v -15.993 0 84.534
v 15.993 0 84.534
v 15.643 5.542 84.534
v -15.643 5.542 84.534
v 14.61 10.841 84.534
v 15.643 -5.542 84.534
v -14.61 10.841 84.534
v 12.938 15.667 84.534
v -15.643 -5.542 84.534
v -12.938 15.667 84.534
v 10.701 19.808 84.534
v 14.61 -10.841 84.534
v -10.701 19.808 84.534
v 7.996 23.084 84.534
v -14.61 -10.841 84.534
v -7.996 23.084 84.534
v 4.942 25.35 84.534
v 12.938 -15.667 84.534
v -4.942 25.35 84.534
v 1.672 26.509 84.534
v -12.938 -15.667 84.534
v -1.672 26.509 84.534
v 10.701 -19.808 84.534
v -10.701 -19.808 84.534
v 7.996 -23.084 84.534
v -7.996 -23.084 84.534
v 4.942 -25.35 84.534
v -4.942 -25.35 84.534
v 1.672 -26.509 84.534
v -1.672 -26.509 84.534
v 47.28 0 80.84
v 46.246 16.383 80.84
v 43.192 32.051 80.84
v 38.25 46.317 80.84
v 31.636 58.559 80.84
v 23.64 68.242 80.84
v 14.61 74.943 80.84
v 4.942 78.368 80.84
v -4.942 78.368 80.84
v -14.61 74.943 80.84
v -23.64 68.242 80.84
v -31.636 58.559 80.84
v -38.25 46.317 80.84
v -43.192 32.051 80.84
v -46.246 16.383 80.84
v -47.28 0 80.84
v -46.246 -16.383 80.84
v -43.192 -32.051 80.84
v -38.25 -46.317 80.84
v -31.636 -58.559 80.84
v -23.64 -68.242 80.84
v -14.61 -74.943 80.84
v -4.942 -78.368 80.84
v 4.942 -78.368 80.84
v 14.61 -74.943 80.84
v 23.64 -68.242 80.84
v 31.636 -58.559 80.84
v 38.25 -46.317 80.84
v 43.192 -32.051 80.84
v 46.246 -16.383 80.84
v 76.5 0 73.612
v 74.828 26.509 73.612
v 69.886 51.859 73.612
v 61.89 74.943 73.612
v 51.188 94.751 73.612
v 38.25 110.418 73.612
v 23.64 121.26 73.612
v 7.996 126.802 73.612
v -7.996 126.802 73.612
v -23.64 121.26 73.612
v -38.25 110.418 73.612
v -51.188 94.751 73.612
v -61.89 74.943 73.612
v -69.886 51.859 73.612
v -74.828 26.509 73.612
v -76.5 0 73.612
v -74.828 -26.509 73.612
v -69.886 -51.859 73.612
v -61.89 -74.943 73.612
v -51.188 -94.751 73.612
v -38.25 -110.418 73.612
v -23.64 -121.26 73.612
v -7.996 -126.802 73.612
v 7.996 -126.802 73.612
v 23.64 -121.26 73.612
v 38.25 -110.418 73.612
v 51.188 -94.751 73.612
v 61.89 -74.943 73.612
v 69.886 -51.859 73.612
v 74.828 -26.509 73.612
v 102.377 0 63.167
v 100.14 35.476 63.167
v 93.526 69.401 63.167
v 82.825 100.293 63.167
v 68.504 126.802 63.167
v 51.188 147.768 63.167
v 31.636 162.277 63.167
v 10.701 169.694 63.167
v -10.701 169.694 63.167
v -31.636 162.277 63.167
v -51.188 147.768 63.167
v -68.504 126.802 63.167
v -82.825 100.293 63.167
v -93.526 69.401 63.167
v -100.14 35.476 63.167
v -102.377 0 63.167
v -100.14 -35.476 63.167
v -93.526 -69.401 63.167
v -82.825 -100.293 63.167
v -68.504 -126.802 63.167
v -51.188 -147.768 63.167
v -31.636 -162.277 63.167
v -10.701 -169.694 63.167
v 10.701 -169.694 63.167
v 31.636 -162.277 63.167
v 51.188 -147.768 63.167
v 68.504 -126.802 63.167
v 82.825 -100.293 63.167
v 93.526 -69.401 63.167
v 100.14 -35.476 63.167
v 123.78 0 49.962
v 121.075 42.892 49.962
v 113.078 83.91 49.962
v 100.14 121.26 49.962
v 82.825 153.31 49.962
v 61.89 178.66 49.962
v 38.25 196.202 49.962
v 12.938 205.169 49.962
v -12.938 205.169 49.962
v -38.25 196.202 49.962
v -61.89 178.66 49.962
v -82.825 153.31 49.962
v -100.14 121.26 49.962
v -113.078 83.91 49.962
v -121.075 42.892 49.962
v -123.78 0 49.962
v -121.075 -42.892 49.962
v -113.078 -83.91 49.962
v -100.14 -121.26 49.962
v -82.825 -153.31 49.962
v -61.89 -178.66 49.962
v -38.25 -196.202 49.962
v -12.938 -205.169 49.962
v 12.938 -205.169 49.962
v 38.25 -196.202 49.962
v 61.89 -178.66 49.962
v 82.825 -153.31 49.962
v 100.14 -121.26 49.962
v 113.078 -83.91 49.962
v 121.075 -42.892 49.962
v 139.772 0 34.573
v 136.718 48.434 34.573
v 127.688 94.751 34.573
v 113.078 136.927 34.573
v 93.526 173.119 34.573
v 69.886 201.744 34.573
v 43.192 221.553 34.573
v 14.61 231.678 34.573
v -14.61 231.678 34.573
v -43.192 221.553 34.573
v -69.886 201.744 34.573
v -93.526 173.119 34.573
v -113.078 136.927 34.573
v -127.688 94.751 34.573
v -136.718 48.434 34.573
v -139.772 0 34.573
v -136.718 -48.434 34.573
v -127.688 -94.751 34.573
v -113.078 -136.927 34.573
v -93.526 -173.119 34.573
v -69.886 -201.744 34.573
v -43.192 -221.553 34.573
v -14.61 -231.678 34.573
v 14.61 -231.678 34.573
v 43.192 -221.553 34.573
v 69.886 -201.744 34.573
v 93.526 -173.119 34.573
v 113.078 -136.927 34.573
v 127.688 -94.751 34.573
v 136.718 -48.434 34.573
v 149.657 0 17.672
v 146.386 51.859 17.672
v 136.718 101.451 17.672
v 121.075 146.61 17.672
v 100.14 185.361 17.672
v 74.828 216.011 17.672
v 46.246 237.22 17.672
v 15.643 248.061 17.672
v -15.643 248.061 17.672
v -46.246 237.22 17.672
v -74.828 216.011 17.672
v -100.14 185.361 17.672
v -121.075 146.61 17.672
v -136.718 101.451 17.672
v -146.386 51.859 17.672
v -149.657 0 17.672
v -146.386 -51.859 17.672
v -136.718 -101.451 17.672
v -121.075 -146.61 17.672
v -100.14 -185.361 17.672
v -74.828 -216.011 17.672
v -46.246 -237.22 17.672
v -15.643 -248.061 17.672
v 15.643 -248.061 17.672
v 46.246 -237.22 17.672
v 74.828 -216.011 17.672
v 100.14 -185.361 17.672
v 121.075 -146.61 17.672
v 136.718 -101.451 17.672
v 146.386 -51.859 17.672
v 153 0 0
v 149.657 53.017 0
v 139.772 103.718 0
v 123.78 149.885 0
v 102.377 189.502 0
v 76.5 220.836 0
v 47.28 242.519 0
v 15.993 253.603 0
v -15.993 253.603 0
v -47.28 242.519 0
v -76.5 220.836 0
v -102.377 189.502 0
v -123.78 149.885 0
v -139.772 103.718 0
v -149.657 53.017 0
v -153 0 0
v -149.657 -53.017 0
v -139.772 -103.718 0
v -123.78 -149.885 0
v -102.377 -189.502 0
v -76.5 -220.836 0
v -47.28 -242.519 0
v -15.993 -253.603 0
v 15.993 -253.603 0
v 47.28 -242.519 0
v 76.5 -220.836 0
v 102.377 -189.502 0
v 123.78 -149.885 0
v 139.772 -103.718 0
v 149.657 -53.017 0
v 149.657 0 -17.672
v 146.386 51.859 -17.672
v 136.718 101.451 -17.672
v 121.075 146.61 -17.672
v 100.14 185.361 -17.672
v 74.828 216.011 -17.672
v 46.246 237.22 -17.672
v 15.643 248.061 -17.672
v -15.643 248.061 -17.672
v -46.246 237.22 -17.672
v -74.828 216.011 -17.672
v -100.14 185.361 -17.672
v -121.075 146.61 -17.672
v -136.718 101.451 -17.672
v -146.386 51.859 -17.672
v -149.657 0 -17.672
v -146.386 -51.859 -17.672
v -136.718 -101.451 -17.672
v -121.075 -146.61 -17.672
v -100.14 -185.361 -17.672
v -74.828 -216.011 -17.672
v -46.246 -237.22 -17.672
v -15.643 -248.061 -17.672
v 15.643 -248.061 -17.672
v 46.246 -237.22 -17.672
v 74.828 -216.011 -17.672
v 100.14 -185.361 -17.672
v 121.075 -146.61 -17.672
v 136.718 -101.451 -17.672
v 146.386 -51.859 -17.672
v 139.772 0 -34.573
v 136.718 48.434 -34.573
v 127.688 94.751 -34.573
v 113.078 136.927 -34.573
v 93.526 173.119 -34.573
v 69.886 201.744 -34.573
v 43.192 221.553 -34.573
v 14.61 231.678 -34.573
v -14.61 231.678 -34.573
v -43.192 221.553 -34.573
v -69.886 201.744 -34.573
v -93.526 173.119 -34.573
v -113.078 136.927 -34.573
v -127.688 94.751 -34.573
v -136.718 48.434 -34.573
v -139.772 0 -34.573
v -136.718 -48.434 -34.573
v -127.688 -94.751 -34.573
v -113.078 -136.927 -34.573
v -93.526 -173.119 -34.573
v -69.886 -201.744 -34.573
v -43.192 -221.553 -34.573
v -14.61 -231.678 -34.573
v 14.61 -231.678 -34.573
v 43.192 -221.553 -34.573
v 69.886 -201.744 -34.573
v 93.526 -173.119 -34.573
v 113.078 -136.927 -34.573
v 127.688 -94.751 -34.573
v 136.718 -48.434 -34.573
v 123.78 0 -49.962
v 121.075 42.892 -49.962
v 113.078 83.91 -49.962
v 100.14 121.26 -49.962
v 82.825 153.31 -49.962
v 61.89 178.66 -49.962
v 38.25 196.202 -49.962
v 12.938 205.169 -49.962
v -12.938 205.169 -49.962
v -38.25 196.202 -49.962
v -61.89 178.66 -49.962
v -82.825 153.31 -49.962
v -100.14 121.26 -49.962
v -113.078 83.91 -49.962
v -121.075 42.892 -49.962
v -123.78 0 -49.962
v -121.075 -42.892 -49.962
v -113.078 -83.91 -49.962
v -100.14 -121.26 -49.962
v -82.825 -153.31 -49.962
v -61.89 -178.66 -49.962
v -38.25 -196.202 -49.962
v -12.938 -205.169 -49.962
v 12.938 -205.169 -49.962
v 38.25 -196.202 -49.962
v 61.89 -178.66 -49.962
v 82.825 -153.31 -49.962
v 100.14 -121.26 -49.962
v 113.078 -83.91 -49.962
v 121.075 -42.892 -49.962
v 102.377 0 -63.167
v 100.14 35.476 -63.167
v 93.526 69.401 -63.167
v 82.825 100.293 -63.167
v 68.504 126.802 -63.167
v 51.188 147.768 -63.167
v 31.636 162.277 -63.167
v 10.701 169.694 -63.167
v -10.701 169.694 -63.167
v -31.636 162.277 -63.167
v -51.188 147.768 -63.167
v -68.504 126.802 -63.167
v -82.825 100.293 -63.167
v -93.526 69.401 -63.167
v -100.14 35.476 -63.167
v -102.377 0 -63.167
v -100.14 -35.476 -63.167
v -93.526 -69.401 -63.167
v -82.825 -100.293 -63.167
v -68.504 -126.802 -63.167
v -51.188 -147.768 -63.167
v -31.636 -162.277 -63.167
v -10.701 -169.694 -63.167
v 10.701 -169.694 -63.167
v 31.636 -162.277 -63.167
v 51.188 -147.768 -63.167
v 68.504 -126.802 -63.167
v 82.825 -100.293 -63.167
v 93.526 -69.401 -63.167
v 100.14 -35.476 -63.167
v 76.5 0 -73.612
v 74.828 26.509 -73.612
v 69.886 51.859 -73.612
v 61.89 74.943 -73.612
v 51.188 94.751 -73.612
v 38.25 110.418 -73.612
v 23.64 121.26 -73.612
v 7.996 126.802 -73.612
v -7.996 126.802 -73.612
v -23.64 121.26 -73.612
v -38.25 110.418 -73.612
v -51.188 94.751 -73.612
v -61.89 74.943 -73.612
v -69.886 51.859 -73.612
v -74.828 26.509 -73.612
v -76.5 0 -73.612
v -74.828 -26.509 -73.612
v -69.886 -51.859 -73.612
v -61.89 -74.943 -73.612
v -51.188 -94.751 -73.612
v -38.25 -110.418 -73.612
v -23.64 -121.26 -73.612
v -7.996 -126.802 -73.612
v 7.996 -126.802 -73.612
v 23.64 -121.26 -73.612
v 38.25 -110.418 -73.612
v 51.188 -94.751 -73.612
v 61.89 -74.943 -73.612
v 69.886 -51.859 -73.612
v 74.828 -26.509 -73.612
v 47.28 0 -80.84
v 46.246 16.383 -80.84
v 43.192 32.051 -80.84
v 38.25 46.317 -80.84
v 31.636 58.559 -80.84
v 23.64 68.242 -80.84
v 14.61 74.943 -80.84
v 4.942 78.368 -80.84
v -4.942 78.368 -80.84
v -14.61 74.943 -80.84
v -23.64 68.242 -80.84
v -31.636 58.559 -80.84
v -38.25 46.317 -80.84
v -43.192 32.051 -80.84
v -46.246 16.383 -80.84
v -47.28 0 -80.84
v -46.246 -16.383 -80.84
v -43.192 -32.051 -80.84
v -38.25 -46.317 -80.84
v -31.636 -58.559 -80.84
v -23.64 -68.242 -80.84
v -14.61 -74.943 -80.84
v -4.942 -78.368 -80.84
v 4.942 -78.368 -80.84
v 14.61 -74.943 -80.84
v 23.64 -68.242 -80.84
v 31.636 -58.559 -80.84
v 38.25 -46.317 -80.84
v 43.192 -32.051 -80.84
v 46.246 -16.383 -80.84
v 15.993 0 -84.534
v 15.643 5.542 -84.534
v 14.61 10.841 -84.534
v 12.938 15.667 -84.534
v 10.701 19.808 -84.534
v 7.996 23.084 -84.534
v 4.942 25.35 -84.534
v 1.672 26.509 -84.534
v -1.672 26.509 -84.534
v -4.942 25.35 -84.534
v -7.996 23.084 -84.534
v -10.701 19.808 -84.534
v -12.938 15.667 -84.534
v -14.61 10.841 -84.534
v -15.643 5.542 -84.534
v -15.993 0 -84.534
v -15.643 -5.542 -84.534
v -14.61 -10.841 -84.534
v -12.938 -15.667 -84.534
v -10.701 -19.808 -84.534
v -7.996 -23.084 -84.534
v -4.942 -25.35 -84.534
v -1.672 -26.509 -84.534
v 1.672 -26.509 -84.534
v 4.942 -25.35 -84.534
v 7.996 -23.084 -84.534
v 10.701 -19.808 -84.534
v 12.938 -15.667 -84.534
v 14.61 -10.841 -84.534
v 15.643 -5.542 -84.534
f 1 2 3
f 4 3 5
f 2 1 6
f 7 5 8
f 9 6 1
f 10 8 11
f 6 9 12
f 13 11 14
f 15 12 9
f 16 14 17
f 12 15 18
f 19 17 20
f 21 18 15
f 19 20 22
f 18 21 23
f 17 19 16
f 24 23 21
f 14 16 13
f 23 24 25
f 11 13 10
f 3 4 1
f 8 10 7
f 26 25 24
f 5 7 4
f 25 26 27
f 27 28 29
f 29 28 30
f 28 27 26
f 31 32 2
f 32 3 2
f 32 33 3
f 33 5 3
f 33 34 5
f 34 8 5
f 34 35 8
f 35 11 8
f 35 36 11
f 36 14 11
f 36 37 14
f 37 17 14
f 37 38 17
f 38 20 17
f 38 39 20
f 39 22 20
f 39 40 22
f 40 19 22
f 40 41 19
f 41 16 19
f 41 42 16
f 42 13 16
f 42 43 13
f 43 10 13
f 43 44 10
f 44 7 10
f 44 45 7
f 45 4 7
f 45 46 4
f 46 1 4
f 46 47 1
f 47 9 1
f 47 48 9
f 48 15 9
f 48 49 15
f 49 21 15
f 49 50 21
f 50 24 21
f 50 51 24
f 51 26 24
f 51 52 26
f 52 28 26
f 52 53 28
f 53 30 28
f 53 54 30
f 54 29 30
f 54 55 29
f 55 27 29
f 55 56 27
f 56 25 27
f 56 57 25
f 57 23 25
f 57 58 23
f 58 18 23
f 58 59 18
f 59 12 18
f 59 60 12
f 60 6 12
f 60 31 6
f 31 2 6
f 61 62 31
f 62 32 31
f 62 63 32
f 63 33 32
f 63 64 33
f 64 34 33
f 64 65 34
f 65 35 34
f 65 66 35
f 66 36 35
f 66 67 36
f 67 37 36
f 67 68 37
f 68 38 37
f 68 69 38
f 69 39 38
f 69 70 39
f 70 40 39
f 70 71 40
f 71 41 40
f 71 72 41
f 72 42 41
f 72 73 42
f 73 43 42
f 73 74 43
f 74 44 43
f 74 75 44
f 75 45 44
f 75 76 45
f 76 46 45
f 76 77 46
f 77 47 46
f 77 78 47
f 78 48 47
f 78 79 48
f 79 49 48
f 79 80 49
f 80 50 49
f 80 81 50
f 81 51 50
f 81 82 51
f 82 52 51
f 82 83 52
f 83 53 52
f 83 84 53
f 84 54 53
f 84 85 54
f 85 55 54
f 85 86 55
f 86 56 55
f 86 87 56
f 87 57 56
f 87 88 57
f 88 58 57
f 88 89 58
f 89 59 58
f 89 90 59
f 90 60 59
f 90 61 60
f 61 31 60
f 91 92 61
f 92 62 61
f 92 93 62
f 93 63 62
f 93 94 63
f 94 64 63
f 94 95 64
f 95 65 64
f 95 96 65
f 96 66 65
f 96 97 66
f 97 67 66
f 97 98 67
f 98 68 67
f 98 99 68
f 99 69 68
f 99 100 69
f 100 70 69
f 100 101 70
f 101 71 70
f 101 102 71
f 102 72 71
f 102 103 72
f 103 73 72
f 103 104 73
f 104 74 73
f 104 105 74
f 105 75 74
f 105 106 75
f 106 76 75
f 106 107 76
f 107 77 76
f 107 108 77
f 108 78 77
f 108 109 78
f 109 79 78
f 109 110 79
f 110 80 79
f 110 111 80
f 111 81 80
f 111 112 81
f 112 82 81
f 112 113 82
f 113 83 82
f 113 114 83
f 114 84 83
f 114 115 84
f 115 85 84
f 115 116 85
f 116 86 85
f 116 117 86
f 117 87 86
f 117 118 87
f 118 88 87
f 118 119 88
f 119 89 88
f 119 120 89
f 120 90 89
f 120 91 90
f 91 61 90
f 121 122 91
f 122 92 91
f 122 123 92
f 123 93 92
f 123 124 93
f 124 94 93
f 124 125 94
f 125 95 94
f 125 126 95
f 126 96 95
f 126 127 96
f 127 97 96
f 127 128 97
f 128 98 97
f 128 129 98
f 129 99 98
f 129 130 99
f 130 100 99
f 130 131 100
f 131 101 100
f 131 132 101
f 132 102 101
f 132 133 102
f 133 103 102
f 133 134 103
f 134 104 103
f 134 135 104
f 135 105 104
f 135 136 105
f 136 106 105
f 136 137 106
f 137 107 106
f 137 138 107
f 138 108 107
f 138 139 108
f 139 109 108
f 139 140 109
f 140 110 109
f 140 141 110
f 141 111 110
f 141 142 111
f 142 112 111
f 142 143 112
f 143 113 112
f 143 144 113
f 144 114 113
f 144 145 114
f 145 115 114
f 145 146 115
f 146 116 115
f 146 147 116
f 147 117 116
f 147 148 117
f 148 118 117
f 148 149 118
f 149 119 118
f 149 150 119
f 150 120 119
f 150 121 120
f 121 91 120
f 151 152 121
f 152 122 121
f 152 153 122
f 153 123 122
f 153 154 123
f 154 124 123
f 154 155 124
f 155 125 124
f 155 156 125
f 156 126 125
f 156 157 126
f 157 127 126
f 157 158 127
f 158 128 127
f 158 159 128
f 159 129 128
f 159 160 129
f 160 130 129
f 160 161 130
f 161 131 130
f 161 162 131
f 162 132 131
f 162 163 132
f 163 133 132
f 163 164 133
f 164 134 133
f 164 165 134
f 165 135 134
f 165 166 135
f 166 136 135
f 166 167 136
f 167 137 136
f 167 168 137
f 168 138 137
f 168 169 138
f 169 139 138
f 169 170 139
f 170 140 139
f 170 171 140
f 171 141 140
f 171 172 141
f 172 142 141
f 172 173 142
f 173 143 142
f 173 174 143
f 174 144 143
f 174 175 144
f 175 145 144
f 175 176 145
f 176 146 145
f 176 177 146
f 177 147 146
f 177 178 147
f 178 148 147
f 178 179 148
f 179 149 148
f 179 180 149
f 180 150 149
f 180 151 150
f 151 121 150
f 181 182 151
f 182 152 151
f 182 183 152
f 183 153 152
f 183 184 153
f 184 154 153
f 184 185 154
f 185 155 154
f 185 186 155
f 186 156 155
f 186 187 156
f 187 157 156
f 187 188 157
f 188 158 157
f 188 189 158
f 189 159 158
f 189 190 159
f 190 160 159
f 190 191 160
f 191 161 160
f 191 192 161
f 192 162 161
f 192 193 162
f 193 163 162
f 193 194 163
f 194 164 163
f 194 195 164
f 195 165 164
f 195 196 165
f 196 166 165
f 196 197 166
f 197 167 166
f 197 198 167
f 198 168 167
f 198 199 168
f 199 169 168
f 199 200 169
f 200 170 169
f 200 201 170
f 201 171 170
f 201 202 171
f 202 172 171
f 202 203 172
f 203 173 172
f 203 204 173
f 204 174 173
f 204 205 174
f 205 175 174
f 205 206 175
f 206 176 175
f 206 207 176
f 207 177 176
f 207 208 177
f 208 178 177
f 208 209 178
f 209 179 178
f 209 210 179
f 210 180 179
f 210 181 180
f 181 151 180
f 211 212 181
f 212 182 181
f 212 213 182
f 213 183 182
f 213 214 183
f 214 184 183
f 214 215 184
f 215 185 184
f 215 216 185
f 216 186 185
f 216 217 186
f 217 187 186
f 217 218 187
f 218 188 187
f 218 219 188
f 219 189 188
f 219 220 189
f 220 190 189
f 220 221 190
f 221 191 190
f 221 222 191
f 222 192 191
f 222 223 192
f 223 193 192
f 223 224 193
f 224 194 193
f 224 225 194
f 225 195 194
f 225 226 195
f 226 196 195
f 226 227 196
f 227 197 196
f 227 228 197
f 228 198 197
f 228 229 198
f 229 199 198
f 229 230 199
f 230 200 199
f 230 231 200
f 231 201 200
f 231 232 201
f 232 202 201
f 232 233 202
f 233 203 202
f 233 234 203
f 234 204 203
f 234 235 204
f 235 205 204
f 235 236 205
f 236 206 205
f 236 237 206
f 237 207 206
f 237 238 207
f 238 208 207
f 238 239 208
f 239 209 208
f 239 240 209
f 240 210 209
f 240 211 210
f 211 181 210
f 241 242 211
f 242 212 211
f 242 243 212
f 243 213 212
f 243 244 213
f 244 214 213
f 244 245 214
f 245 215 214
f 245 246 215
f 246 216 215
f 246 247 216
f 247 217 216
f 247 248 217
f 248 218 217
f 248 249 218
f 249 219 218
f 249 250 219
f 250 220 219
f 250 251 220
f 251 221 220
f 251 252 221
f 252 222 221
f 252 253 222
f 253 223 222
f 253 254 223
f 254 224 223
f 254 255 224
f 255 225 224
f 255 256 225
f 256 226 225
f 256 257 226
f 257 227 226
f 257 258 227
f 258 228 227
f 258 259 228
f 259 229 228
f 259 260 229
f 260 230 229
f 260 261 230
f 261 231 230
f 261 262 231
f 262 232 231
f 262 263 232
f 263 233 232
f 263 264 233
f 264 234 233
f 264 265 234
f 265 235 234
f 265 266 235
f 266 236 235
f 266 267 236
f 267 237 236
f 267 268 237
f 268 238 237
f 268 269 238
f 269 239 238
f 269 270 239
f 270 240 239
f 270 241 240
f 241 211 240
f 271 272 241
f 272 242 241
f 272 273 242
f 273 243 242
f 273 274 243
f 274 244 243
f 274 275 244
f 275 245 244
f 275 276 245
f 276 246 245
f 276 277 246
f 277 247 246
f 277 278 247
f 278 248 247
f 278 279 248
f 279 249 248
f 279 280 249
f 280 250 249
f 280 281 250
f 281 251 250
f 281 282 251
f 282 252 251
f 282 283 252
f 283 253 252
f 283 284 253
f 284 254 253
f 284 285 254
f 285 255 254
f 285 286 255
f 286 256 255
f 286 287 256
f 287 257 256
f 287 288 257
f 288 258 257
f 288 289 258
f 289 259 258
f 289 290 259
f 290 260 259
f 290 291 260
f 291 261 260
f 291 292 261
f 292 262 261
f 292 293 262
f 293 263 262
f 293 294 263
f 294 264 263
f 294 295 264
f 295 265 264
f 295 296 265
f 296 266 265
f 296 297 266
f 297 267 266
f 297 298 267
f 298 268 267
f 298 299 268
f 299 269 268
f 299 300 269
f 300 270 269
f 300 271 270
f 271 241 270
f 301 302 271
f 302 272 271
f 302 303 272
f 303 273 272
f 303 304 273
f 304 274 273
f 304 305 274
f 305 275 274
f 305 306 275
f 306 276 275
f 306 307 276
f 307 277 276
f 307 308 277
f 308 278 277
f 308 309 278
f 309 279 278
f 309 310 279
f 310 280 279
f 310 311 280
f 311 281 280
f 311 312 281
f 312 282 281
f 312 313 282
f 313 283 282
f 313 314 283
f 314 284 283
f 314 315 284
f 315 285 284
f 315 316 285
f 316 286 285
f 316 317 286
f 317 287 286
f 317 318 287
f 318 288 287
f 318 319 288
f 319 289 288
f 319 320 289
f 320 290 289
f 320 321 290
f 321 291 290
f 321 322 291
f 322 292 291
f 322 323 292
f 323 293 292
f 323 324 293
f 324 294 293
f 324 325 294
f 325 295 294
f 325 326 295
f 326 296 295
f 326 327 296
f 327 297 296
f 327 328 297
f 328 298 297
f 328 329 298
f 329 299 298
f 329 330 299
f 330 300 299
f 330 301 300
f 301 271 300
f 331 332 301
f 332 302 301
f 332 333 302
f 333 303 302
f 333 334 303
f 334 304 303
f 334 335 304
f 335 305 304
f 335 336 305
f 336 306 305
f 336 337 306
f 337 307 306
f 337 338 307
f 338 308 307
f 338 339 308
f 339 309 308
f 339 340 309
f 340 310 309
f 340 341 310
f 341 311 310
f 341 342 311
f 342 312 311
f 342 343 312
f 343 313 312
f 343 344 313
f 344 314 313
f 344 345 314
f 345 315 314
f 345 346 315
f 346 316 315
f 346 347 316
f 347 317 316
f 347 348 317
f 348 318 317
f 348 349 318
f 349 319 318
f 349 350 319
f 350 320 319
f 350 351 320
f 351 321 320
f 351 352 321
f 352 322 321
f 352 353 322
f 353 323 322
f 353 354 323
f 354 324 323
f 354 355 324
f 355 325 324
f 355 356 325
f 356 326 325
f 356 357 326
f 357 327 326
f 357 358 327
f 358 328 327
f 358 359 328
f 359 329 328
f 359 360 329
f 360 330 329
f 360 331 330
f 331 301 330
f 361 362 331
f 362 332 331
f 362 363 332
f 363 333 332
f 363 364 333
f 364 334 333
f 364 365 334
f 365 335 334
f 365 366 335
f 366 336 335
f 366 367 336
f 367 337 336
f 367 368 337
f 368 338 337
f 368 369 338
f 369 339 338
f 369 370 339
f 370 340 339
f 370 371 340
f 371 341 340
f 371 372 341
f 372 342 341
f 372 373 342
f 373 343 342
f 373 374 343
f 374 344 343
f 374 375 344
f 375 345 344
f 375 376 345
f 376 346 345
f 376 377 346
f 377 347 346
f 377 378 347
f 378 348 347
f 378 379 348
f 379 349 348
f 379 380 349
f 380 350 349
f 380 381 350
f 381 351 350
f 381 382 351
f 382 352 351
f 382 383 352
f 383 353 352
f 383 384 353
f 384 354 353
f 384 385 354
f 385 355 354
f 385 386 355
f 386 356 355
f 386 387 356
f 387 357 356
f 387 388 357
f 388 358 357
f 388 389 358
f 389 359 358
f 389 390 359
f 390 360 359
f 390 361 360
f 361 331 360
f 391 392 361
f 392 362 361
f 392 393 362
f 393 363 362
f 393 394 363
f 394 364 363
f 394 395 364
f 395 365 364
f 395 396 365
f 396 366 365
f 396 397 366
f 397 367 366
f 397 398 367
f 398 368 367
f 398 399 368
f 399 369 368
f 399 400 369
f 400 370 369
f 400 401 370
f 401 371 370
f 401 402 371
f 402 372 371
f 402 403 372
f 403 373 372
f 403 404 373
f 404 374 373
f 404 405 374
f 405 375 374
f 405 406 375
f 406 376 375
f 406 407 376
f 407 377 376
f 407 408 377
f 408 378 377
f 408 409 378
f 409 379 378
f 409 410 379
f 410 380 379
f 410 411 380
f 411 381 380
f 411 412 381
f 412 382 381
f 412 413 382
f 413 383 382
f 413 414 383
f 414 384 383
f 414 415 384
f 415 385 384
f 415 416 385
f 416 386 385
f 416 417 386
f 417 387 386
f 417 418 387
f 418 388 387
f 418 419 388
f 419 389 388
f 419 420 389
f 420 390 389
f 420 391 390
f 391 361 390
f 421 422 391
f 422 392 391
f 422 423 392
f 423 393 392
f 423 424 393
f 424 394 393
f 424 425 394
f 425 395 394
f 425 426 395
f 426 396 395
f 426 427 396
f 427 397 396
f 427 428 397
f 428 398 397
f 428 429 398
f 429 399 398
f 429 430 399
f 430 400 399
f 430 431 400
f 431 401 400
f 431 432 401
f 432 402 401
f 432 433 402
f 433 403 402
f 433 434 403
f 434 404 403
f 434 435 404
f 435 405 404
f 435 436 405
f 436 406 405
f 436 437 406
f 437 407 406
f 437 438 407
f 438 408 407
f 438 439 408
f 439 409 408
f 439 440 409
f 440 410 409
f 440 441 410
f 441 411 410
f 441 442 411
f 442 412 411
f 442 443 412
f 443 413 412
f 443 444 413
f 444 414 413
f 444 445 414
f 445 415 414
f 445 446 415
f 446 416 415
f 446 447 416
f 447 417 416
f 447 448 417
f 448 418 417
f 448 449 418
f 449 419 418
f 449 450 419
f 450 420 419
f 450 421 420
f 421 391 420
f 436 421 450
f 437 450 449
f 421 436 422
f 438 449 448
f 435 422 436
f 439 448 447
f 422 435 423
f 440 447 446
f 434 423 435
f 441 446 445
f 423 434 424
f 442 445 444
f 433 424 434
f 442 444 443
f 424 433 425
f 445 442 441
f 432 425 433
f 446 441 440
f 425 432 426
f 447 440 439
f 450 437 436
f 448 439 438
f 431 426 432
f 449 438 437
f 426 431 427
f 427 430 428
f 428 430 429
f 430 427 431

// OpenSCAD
// Generated by SolidPython 1.0.1 on 2020-07-29 00:46:49


scale(v = [9, 15, 5]) {
	sphere(r = 17);
}
/***********************************************
*********      SolidPython code:      **********
************************************************
 
# import packages: SolidPython
from solid import *
from solid.utils import *
from itertools import chain, combinations, permutations


class Resize:

    def __init__(self, scad_file):
        self.scad_file = scad_file
        #self.scad_file = import_scad(scad_file)
        # cone/cylinder param:
        self.r1 = 0
        self.r2 = 0
        self.h = 0
        # rectangular prism param:
        self.w = 0
        self.l = 0
        # ellipse param:
        self.r = 0

    # import OpenScad code (file name corresponds to shape)


    # classify shape + parameters
    def assign(self, param1, param2, param3):
        if self.scad_file == 'cone.scad':
            self.r1 = param1
            self.r2 = param2
            self.h = param3
        elif self.scad_file == 'cylinder.scad':
            self.r1 = param1
            self.r2 = param2
            self.h = param3
        elif self.scad_file == 'rectangularPrism.scad':
            self.h = param1
            self.l = param2
            self.w = param3
        else:
            self.r = param1
            self.h = param2

    # resize parameters
    def iterate(self):
        x = range(3, 20, 2)
        i = 1
        if self.scad_file == 'cone.scad':
            tempList = list(permutations(x, 2))
            for temp in tempList:
                param1 = temp[0]
                param2 = temp[1]
                filepath = 'produced_scad_files/' + 'cone' + str(param1) + '_' + str(param2) + '_' + '.scad'
                scad_render_to_file(cylinder(h=param1, r1=param2, r2=0), filepath)

        elif self.scad_file == 'cylinder.scad':
            tempList = list(permutations(x, 3))
            for temp in tempList:
                param1 = temp[0]
                param2 = temp[1]
                filepath = 'produced_scad_files/' + 'cylinder' + str(param1) + '_' + str(param2) + '_' + '.scad'
                scad_render_to_file(cylinder(h=param1, r1=param2, r2=param2), filepath)

        elif self.scad_file == 'rectangularPrism.scad':
            tempList = list(permutations(x, 3))
            for temp in tempList:
                param1 = temp[0]
                param2 = temp[1]
                param3 = temp[2]
                filepath = 'produced_scad_files/' + 'rectangularPrism' + str(param1) + '_' + str(param2) + '_' + str(
                    param3) + '.scad'
                scad_render_to_file(cube(size=(param1, param2, param3)), filepath)

        elif self.scad_file == 'ellipse.scad':
            tempList = list(permutations(x, 4))
            for temp in tempList:
                param1 = temp[0]
                param2 = temp[1]
                param3 = temp[2]
                param4 = temp[3]
                filepath = 'produced_scad_files/' + 'ellipse' + str(param1) + '_' + str(param2) + '_' + str(param3) + '_' + str(param4) + '.scad'
                scad_render_to_file(scale([param1, param2, param3])(sphere(r=param4)), filepath)

    def render_to_scadfile(self):
        scad_render_to_file(scad, 'example.scad') 
 
************************************************/
